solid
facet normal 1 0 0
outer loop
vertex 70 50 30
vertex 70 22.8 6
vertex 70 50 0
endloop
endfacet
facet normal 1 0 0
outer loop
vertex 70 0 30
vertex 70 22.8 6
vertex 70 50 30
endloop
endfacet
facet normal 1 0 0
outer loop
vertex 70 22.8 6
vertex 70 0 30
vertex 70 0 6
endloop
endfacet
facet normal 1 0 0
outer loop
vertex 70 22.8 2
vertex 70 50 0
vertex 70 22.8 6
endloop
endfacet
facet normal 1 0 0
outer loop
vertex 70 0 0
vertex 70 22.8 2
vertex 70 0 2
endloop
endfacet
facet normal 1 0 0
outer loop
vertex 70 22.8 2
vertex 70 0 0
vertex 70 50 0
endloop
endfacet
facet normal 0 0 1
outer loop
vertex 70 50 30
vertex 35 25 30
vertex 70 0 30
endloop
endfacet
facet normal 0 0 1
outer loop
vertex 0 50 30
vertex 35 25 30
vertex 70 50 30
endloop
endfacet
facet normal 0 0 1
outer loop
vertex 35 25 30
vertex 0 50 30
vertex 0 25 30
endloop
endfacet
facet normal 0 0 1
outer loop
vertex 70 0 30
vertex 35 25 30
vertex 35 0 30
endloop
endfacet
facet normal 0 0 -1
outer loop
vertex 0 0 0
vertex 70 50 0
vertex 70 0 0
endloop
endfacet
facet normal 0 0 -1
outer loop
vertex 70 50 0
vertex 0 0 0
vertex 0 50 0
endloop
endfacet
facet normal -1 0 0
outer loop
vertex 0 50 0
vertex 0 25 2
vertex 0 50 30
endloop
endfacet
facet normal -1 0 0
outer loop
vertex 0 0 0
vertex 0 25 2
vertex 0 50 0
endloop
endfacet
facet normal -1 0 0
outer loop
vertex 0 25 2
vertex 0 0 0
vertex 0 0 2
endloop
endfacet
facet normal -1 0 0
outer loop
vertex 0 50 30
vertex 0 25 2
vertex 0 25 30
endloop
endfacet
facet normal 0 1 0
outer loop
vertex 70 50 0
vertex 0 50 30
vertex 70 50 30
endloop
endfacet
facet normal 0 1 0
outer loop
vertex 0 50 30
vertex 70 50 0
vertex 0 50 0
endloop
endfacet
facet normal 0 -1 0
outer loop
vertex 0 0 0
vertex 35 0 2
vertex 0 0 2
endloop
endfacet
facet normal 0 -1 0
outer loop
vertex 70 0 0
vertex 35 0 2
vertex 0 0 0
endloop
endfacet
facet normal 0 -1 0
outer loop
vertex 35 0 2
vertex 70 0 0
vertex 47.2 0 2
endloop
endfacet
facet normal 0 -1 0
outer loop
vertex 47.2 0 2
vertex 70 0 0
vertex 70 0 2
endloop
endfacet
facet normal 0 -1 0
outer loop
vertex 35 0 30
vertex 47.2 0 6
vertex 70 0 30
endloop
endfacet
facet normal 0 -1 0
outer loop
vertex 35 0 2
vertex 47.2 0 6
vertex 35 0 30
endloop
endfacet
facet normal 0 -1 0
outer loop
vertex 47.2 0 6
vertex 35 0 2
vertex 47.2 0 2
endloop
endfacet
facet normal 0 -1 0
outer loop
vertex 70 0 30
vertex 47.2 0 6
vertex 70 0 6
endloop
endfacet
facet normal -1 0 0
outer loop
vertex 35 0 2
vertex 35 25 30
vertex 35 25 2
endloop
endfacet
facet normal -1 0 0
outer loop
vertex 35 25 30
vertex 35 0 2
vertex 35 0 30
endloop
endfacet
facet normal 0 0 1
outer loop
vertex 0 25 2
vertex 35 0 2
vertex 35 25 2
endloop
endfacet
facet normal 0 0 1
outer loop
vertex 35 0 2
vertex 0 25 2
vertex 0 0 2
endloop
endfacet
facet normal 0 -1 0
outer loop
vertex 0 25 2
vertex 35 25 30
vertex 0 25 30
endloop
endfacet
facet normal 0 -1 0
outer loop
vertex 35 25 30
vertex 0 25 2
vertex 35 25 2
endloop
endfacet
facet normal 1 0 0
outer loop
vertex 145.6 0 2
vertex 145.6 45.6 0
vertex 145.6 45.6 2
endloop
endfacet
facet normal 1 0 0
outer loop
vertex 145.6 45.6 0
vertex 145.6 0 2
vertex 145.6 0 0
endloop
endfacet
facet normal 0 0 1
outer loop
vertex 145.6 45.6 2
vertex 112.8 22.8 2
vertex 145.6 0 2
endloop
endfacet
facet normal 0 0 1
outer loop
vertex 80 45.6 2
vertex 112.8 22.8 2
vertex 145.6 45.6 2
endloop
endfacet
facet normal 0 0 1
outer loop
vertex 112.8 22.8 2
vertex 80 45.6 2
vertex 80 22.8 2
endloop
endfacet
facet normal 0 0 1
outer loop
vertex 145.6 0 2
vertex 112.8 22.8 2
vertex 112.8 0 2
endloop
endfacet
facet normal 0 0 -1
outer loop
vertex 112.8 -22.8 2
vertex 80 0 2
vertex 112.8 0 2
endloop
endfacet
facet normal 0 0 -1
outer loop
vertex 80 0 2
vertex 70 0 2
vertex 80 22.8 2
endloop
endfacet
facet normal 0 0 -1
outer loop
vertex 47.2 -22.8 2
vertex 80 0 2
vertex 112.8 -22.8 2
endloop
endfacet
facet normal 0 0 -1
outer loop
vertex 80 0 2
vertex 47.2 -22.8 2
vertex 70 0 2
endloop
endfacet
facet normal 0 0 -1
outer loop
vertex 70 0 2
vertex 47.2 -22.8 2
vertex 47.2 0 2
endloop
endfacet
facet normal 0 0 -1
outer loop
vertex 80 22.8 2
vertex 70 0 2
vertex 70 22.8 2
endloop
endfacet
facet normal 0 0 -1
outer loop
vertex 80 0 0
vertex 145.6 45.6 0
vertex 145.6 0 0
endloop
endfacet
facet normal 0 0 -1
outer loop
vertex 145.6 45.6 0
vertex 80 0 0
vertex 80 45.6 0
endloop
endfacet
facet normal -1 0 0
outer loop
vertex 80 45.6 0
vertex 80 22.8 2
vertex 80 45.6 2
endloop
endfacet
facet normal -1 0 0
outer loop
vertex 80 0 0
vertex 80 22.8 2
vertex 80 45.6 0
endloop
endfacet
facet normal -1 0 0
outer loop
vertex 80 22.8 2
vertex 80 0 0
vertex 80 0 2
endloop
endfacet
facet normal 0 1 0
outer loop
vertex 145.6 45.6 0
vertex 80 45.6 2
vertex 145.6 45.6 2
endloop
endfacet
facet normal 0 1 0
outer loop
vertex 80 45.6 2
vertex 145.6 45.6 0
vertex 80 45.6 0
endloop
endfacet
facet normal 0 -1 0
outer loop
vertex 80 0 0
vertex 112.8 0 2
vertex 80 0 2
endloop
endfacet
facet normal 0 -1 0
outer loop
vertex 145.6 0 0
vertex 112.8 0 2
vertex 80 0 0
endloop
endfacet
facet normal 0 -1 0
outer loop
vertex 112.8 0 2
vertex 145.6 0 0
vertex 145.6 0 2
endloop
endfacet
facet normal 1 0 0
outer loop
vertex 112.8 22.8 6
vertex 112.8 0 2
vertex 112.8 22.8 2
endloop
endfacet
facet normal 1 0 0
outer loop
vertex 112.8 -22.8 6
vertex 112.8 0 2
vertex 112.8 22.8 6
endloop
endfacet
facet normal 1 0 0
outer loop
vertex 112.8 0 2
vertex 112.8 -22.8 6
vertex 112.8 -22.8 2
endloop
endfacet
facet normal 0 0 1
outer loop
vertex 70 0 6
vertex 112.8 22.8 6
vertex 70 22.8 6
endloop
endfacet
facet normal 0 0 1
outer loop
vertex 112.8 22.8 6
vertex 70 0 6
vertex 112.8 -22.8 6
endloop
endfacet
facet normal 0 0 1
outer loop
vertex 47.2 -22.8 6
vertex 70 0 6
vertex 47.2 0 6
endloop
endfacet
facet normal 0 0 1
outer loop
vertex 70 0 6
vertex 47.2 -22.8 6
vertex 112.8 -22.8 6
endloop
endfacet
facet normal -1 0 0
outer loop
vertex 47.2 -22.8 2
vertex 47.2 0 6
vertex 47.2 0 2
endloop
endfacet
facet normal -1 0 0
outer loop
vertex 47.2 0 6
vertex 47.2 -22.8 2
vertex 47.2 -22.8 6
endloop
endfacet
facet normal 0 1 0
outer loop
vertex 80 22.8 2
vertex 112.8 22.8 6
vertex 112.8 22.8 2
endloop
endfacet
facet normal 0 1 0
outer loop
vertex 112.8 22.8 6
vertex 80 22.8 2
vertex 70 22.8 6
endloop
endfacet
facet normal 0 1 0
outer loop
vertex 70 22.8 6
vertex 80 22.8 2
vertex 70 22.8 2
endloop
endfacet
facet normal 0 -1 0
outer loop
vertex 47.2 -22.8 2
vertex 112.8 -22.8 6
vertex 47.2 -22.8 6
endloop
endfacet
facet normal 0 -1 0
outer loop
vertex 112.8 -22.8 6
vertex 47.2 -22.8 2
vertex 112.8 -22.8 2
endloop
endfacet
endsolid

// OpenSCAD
// Two-part enclosure for small electronics board
// Print orientation: box standing on bed, lid flat on bed to the +X side

$fn = 64;

// ---- Box ----
box_outer_x = 70;      // outer length (X)
box_outer_y = 50;      // outer width (Y)
box_outer_z = 30;      // outer height (Z)
wall        = 2;       // wall thickness
floor       = 2;       // floor thickness

// ---- Lid ----
lip_outer_x   = 65.6;  // outer length of lip
lip_outer_y   = 45.6;  // outer width of lip
lip_thickness = 1.5;   // lip wall thickness
lip_height    = 4;     // lip height above plate
plate_t       = 2;     // plate thickness
clearance     = 0.2;   // gap between lip inner edge and box opening

// ---- Layout ----
gap      = 10;         // gap between box and lid
lip_over = 0.2;        // lip extends past box opening in X and Y

module box() {
    difference() {
        cube([box_outer_x, box_outer_y, box_outer_z]);
        // Open top - cut extends above the top face
        translate([-box_outer_x/2, -box_outer_y/2, floor])
            cube([box_outer_x, box_outer_y, box_outer_z - floor + 0.01]);
    }
}

module lid() {
    union() {
        // Base plate
        translate([0, 0, 0])
            cube([lip_outer_x, lip_outer_y, plate_t]);
        // Rectangular lip on top
        translate([-lip_outer_x/2, -lip_outer_y/2, plate_t])
            cube([lip_outer_x, lip_outer_y, lip_height]);
    }
}

difference() {
    union() {
        translate([0, 0, 0])
            box();
        // Lid placed on the +X side of the box
        translate([box_outer_x + gap, 0, 0])
            lid();
    }
    // Box opening (extends above top face to avoid coplanar faces)
    translate([-box_outer_x/2, -box_outer_y/2, floor])
        cube([box_outer_x, box_outer_y, box_outer_z - floor + 0.01]);
}
